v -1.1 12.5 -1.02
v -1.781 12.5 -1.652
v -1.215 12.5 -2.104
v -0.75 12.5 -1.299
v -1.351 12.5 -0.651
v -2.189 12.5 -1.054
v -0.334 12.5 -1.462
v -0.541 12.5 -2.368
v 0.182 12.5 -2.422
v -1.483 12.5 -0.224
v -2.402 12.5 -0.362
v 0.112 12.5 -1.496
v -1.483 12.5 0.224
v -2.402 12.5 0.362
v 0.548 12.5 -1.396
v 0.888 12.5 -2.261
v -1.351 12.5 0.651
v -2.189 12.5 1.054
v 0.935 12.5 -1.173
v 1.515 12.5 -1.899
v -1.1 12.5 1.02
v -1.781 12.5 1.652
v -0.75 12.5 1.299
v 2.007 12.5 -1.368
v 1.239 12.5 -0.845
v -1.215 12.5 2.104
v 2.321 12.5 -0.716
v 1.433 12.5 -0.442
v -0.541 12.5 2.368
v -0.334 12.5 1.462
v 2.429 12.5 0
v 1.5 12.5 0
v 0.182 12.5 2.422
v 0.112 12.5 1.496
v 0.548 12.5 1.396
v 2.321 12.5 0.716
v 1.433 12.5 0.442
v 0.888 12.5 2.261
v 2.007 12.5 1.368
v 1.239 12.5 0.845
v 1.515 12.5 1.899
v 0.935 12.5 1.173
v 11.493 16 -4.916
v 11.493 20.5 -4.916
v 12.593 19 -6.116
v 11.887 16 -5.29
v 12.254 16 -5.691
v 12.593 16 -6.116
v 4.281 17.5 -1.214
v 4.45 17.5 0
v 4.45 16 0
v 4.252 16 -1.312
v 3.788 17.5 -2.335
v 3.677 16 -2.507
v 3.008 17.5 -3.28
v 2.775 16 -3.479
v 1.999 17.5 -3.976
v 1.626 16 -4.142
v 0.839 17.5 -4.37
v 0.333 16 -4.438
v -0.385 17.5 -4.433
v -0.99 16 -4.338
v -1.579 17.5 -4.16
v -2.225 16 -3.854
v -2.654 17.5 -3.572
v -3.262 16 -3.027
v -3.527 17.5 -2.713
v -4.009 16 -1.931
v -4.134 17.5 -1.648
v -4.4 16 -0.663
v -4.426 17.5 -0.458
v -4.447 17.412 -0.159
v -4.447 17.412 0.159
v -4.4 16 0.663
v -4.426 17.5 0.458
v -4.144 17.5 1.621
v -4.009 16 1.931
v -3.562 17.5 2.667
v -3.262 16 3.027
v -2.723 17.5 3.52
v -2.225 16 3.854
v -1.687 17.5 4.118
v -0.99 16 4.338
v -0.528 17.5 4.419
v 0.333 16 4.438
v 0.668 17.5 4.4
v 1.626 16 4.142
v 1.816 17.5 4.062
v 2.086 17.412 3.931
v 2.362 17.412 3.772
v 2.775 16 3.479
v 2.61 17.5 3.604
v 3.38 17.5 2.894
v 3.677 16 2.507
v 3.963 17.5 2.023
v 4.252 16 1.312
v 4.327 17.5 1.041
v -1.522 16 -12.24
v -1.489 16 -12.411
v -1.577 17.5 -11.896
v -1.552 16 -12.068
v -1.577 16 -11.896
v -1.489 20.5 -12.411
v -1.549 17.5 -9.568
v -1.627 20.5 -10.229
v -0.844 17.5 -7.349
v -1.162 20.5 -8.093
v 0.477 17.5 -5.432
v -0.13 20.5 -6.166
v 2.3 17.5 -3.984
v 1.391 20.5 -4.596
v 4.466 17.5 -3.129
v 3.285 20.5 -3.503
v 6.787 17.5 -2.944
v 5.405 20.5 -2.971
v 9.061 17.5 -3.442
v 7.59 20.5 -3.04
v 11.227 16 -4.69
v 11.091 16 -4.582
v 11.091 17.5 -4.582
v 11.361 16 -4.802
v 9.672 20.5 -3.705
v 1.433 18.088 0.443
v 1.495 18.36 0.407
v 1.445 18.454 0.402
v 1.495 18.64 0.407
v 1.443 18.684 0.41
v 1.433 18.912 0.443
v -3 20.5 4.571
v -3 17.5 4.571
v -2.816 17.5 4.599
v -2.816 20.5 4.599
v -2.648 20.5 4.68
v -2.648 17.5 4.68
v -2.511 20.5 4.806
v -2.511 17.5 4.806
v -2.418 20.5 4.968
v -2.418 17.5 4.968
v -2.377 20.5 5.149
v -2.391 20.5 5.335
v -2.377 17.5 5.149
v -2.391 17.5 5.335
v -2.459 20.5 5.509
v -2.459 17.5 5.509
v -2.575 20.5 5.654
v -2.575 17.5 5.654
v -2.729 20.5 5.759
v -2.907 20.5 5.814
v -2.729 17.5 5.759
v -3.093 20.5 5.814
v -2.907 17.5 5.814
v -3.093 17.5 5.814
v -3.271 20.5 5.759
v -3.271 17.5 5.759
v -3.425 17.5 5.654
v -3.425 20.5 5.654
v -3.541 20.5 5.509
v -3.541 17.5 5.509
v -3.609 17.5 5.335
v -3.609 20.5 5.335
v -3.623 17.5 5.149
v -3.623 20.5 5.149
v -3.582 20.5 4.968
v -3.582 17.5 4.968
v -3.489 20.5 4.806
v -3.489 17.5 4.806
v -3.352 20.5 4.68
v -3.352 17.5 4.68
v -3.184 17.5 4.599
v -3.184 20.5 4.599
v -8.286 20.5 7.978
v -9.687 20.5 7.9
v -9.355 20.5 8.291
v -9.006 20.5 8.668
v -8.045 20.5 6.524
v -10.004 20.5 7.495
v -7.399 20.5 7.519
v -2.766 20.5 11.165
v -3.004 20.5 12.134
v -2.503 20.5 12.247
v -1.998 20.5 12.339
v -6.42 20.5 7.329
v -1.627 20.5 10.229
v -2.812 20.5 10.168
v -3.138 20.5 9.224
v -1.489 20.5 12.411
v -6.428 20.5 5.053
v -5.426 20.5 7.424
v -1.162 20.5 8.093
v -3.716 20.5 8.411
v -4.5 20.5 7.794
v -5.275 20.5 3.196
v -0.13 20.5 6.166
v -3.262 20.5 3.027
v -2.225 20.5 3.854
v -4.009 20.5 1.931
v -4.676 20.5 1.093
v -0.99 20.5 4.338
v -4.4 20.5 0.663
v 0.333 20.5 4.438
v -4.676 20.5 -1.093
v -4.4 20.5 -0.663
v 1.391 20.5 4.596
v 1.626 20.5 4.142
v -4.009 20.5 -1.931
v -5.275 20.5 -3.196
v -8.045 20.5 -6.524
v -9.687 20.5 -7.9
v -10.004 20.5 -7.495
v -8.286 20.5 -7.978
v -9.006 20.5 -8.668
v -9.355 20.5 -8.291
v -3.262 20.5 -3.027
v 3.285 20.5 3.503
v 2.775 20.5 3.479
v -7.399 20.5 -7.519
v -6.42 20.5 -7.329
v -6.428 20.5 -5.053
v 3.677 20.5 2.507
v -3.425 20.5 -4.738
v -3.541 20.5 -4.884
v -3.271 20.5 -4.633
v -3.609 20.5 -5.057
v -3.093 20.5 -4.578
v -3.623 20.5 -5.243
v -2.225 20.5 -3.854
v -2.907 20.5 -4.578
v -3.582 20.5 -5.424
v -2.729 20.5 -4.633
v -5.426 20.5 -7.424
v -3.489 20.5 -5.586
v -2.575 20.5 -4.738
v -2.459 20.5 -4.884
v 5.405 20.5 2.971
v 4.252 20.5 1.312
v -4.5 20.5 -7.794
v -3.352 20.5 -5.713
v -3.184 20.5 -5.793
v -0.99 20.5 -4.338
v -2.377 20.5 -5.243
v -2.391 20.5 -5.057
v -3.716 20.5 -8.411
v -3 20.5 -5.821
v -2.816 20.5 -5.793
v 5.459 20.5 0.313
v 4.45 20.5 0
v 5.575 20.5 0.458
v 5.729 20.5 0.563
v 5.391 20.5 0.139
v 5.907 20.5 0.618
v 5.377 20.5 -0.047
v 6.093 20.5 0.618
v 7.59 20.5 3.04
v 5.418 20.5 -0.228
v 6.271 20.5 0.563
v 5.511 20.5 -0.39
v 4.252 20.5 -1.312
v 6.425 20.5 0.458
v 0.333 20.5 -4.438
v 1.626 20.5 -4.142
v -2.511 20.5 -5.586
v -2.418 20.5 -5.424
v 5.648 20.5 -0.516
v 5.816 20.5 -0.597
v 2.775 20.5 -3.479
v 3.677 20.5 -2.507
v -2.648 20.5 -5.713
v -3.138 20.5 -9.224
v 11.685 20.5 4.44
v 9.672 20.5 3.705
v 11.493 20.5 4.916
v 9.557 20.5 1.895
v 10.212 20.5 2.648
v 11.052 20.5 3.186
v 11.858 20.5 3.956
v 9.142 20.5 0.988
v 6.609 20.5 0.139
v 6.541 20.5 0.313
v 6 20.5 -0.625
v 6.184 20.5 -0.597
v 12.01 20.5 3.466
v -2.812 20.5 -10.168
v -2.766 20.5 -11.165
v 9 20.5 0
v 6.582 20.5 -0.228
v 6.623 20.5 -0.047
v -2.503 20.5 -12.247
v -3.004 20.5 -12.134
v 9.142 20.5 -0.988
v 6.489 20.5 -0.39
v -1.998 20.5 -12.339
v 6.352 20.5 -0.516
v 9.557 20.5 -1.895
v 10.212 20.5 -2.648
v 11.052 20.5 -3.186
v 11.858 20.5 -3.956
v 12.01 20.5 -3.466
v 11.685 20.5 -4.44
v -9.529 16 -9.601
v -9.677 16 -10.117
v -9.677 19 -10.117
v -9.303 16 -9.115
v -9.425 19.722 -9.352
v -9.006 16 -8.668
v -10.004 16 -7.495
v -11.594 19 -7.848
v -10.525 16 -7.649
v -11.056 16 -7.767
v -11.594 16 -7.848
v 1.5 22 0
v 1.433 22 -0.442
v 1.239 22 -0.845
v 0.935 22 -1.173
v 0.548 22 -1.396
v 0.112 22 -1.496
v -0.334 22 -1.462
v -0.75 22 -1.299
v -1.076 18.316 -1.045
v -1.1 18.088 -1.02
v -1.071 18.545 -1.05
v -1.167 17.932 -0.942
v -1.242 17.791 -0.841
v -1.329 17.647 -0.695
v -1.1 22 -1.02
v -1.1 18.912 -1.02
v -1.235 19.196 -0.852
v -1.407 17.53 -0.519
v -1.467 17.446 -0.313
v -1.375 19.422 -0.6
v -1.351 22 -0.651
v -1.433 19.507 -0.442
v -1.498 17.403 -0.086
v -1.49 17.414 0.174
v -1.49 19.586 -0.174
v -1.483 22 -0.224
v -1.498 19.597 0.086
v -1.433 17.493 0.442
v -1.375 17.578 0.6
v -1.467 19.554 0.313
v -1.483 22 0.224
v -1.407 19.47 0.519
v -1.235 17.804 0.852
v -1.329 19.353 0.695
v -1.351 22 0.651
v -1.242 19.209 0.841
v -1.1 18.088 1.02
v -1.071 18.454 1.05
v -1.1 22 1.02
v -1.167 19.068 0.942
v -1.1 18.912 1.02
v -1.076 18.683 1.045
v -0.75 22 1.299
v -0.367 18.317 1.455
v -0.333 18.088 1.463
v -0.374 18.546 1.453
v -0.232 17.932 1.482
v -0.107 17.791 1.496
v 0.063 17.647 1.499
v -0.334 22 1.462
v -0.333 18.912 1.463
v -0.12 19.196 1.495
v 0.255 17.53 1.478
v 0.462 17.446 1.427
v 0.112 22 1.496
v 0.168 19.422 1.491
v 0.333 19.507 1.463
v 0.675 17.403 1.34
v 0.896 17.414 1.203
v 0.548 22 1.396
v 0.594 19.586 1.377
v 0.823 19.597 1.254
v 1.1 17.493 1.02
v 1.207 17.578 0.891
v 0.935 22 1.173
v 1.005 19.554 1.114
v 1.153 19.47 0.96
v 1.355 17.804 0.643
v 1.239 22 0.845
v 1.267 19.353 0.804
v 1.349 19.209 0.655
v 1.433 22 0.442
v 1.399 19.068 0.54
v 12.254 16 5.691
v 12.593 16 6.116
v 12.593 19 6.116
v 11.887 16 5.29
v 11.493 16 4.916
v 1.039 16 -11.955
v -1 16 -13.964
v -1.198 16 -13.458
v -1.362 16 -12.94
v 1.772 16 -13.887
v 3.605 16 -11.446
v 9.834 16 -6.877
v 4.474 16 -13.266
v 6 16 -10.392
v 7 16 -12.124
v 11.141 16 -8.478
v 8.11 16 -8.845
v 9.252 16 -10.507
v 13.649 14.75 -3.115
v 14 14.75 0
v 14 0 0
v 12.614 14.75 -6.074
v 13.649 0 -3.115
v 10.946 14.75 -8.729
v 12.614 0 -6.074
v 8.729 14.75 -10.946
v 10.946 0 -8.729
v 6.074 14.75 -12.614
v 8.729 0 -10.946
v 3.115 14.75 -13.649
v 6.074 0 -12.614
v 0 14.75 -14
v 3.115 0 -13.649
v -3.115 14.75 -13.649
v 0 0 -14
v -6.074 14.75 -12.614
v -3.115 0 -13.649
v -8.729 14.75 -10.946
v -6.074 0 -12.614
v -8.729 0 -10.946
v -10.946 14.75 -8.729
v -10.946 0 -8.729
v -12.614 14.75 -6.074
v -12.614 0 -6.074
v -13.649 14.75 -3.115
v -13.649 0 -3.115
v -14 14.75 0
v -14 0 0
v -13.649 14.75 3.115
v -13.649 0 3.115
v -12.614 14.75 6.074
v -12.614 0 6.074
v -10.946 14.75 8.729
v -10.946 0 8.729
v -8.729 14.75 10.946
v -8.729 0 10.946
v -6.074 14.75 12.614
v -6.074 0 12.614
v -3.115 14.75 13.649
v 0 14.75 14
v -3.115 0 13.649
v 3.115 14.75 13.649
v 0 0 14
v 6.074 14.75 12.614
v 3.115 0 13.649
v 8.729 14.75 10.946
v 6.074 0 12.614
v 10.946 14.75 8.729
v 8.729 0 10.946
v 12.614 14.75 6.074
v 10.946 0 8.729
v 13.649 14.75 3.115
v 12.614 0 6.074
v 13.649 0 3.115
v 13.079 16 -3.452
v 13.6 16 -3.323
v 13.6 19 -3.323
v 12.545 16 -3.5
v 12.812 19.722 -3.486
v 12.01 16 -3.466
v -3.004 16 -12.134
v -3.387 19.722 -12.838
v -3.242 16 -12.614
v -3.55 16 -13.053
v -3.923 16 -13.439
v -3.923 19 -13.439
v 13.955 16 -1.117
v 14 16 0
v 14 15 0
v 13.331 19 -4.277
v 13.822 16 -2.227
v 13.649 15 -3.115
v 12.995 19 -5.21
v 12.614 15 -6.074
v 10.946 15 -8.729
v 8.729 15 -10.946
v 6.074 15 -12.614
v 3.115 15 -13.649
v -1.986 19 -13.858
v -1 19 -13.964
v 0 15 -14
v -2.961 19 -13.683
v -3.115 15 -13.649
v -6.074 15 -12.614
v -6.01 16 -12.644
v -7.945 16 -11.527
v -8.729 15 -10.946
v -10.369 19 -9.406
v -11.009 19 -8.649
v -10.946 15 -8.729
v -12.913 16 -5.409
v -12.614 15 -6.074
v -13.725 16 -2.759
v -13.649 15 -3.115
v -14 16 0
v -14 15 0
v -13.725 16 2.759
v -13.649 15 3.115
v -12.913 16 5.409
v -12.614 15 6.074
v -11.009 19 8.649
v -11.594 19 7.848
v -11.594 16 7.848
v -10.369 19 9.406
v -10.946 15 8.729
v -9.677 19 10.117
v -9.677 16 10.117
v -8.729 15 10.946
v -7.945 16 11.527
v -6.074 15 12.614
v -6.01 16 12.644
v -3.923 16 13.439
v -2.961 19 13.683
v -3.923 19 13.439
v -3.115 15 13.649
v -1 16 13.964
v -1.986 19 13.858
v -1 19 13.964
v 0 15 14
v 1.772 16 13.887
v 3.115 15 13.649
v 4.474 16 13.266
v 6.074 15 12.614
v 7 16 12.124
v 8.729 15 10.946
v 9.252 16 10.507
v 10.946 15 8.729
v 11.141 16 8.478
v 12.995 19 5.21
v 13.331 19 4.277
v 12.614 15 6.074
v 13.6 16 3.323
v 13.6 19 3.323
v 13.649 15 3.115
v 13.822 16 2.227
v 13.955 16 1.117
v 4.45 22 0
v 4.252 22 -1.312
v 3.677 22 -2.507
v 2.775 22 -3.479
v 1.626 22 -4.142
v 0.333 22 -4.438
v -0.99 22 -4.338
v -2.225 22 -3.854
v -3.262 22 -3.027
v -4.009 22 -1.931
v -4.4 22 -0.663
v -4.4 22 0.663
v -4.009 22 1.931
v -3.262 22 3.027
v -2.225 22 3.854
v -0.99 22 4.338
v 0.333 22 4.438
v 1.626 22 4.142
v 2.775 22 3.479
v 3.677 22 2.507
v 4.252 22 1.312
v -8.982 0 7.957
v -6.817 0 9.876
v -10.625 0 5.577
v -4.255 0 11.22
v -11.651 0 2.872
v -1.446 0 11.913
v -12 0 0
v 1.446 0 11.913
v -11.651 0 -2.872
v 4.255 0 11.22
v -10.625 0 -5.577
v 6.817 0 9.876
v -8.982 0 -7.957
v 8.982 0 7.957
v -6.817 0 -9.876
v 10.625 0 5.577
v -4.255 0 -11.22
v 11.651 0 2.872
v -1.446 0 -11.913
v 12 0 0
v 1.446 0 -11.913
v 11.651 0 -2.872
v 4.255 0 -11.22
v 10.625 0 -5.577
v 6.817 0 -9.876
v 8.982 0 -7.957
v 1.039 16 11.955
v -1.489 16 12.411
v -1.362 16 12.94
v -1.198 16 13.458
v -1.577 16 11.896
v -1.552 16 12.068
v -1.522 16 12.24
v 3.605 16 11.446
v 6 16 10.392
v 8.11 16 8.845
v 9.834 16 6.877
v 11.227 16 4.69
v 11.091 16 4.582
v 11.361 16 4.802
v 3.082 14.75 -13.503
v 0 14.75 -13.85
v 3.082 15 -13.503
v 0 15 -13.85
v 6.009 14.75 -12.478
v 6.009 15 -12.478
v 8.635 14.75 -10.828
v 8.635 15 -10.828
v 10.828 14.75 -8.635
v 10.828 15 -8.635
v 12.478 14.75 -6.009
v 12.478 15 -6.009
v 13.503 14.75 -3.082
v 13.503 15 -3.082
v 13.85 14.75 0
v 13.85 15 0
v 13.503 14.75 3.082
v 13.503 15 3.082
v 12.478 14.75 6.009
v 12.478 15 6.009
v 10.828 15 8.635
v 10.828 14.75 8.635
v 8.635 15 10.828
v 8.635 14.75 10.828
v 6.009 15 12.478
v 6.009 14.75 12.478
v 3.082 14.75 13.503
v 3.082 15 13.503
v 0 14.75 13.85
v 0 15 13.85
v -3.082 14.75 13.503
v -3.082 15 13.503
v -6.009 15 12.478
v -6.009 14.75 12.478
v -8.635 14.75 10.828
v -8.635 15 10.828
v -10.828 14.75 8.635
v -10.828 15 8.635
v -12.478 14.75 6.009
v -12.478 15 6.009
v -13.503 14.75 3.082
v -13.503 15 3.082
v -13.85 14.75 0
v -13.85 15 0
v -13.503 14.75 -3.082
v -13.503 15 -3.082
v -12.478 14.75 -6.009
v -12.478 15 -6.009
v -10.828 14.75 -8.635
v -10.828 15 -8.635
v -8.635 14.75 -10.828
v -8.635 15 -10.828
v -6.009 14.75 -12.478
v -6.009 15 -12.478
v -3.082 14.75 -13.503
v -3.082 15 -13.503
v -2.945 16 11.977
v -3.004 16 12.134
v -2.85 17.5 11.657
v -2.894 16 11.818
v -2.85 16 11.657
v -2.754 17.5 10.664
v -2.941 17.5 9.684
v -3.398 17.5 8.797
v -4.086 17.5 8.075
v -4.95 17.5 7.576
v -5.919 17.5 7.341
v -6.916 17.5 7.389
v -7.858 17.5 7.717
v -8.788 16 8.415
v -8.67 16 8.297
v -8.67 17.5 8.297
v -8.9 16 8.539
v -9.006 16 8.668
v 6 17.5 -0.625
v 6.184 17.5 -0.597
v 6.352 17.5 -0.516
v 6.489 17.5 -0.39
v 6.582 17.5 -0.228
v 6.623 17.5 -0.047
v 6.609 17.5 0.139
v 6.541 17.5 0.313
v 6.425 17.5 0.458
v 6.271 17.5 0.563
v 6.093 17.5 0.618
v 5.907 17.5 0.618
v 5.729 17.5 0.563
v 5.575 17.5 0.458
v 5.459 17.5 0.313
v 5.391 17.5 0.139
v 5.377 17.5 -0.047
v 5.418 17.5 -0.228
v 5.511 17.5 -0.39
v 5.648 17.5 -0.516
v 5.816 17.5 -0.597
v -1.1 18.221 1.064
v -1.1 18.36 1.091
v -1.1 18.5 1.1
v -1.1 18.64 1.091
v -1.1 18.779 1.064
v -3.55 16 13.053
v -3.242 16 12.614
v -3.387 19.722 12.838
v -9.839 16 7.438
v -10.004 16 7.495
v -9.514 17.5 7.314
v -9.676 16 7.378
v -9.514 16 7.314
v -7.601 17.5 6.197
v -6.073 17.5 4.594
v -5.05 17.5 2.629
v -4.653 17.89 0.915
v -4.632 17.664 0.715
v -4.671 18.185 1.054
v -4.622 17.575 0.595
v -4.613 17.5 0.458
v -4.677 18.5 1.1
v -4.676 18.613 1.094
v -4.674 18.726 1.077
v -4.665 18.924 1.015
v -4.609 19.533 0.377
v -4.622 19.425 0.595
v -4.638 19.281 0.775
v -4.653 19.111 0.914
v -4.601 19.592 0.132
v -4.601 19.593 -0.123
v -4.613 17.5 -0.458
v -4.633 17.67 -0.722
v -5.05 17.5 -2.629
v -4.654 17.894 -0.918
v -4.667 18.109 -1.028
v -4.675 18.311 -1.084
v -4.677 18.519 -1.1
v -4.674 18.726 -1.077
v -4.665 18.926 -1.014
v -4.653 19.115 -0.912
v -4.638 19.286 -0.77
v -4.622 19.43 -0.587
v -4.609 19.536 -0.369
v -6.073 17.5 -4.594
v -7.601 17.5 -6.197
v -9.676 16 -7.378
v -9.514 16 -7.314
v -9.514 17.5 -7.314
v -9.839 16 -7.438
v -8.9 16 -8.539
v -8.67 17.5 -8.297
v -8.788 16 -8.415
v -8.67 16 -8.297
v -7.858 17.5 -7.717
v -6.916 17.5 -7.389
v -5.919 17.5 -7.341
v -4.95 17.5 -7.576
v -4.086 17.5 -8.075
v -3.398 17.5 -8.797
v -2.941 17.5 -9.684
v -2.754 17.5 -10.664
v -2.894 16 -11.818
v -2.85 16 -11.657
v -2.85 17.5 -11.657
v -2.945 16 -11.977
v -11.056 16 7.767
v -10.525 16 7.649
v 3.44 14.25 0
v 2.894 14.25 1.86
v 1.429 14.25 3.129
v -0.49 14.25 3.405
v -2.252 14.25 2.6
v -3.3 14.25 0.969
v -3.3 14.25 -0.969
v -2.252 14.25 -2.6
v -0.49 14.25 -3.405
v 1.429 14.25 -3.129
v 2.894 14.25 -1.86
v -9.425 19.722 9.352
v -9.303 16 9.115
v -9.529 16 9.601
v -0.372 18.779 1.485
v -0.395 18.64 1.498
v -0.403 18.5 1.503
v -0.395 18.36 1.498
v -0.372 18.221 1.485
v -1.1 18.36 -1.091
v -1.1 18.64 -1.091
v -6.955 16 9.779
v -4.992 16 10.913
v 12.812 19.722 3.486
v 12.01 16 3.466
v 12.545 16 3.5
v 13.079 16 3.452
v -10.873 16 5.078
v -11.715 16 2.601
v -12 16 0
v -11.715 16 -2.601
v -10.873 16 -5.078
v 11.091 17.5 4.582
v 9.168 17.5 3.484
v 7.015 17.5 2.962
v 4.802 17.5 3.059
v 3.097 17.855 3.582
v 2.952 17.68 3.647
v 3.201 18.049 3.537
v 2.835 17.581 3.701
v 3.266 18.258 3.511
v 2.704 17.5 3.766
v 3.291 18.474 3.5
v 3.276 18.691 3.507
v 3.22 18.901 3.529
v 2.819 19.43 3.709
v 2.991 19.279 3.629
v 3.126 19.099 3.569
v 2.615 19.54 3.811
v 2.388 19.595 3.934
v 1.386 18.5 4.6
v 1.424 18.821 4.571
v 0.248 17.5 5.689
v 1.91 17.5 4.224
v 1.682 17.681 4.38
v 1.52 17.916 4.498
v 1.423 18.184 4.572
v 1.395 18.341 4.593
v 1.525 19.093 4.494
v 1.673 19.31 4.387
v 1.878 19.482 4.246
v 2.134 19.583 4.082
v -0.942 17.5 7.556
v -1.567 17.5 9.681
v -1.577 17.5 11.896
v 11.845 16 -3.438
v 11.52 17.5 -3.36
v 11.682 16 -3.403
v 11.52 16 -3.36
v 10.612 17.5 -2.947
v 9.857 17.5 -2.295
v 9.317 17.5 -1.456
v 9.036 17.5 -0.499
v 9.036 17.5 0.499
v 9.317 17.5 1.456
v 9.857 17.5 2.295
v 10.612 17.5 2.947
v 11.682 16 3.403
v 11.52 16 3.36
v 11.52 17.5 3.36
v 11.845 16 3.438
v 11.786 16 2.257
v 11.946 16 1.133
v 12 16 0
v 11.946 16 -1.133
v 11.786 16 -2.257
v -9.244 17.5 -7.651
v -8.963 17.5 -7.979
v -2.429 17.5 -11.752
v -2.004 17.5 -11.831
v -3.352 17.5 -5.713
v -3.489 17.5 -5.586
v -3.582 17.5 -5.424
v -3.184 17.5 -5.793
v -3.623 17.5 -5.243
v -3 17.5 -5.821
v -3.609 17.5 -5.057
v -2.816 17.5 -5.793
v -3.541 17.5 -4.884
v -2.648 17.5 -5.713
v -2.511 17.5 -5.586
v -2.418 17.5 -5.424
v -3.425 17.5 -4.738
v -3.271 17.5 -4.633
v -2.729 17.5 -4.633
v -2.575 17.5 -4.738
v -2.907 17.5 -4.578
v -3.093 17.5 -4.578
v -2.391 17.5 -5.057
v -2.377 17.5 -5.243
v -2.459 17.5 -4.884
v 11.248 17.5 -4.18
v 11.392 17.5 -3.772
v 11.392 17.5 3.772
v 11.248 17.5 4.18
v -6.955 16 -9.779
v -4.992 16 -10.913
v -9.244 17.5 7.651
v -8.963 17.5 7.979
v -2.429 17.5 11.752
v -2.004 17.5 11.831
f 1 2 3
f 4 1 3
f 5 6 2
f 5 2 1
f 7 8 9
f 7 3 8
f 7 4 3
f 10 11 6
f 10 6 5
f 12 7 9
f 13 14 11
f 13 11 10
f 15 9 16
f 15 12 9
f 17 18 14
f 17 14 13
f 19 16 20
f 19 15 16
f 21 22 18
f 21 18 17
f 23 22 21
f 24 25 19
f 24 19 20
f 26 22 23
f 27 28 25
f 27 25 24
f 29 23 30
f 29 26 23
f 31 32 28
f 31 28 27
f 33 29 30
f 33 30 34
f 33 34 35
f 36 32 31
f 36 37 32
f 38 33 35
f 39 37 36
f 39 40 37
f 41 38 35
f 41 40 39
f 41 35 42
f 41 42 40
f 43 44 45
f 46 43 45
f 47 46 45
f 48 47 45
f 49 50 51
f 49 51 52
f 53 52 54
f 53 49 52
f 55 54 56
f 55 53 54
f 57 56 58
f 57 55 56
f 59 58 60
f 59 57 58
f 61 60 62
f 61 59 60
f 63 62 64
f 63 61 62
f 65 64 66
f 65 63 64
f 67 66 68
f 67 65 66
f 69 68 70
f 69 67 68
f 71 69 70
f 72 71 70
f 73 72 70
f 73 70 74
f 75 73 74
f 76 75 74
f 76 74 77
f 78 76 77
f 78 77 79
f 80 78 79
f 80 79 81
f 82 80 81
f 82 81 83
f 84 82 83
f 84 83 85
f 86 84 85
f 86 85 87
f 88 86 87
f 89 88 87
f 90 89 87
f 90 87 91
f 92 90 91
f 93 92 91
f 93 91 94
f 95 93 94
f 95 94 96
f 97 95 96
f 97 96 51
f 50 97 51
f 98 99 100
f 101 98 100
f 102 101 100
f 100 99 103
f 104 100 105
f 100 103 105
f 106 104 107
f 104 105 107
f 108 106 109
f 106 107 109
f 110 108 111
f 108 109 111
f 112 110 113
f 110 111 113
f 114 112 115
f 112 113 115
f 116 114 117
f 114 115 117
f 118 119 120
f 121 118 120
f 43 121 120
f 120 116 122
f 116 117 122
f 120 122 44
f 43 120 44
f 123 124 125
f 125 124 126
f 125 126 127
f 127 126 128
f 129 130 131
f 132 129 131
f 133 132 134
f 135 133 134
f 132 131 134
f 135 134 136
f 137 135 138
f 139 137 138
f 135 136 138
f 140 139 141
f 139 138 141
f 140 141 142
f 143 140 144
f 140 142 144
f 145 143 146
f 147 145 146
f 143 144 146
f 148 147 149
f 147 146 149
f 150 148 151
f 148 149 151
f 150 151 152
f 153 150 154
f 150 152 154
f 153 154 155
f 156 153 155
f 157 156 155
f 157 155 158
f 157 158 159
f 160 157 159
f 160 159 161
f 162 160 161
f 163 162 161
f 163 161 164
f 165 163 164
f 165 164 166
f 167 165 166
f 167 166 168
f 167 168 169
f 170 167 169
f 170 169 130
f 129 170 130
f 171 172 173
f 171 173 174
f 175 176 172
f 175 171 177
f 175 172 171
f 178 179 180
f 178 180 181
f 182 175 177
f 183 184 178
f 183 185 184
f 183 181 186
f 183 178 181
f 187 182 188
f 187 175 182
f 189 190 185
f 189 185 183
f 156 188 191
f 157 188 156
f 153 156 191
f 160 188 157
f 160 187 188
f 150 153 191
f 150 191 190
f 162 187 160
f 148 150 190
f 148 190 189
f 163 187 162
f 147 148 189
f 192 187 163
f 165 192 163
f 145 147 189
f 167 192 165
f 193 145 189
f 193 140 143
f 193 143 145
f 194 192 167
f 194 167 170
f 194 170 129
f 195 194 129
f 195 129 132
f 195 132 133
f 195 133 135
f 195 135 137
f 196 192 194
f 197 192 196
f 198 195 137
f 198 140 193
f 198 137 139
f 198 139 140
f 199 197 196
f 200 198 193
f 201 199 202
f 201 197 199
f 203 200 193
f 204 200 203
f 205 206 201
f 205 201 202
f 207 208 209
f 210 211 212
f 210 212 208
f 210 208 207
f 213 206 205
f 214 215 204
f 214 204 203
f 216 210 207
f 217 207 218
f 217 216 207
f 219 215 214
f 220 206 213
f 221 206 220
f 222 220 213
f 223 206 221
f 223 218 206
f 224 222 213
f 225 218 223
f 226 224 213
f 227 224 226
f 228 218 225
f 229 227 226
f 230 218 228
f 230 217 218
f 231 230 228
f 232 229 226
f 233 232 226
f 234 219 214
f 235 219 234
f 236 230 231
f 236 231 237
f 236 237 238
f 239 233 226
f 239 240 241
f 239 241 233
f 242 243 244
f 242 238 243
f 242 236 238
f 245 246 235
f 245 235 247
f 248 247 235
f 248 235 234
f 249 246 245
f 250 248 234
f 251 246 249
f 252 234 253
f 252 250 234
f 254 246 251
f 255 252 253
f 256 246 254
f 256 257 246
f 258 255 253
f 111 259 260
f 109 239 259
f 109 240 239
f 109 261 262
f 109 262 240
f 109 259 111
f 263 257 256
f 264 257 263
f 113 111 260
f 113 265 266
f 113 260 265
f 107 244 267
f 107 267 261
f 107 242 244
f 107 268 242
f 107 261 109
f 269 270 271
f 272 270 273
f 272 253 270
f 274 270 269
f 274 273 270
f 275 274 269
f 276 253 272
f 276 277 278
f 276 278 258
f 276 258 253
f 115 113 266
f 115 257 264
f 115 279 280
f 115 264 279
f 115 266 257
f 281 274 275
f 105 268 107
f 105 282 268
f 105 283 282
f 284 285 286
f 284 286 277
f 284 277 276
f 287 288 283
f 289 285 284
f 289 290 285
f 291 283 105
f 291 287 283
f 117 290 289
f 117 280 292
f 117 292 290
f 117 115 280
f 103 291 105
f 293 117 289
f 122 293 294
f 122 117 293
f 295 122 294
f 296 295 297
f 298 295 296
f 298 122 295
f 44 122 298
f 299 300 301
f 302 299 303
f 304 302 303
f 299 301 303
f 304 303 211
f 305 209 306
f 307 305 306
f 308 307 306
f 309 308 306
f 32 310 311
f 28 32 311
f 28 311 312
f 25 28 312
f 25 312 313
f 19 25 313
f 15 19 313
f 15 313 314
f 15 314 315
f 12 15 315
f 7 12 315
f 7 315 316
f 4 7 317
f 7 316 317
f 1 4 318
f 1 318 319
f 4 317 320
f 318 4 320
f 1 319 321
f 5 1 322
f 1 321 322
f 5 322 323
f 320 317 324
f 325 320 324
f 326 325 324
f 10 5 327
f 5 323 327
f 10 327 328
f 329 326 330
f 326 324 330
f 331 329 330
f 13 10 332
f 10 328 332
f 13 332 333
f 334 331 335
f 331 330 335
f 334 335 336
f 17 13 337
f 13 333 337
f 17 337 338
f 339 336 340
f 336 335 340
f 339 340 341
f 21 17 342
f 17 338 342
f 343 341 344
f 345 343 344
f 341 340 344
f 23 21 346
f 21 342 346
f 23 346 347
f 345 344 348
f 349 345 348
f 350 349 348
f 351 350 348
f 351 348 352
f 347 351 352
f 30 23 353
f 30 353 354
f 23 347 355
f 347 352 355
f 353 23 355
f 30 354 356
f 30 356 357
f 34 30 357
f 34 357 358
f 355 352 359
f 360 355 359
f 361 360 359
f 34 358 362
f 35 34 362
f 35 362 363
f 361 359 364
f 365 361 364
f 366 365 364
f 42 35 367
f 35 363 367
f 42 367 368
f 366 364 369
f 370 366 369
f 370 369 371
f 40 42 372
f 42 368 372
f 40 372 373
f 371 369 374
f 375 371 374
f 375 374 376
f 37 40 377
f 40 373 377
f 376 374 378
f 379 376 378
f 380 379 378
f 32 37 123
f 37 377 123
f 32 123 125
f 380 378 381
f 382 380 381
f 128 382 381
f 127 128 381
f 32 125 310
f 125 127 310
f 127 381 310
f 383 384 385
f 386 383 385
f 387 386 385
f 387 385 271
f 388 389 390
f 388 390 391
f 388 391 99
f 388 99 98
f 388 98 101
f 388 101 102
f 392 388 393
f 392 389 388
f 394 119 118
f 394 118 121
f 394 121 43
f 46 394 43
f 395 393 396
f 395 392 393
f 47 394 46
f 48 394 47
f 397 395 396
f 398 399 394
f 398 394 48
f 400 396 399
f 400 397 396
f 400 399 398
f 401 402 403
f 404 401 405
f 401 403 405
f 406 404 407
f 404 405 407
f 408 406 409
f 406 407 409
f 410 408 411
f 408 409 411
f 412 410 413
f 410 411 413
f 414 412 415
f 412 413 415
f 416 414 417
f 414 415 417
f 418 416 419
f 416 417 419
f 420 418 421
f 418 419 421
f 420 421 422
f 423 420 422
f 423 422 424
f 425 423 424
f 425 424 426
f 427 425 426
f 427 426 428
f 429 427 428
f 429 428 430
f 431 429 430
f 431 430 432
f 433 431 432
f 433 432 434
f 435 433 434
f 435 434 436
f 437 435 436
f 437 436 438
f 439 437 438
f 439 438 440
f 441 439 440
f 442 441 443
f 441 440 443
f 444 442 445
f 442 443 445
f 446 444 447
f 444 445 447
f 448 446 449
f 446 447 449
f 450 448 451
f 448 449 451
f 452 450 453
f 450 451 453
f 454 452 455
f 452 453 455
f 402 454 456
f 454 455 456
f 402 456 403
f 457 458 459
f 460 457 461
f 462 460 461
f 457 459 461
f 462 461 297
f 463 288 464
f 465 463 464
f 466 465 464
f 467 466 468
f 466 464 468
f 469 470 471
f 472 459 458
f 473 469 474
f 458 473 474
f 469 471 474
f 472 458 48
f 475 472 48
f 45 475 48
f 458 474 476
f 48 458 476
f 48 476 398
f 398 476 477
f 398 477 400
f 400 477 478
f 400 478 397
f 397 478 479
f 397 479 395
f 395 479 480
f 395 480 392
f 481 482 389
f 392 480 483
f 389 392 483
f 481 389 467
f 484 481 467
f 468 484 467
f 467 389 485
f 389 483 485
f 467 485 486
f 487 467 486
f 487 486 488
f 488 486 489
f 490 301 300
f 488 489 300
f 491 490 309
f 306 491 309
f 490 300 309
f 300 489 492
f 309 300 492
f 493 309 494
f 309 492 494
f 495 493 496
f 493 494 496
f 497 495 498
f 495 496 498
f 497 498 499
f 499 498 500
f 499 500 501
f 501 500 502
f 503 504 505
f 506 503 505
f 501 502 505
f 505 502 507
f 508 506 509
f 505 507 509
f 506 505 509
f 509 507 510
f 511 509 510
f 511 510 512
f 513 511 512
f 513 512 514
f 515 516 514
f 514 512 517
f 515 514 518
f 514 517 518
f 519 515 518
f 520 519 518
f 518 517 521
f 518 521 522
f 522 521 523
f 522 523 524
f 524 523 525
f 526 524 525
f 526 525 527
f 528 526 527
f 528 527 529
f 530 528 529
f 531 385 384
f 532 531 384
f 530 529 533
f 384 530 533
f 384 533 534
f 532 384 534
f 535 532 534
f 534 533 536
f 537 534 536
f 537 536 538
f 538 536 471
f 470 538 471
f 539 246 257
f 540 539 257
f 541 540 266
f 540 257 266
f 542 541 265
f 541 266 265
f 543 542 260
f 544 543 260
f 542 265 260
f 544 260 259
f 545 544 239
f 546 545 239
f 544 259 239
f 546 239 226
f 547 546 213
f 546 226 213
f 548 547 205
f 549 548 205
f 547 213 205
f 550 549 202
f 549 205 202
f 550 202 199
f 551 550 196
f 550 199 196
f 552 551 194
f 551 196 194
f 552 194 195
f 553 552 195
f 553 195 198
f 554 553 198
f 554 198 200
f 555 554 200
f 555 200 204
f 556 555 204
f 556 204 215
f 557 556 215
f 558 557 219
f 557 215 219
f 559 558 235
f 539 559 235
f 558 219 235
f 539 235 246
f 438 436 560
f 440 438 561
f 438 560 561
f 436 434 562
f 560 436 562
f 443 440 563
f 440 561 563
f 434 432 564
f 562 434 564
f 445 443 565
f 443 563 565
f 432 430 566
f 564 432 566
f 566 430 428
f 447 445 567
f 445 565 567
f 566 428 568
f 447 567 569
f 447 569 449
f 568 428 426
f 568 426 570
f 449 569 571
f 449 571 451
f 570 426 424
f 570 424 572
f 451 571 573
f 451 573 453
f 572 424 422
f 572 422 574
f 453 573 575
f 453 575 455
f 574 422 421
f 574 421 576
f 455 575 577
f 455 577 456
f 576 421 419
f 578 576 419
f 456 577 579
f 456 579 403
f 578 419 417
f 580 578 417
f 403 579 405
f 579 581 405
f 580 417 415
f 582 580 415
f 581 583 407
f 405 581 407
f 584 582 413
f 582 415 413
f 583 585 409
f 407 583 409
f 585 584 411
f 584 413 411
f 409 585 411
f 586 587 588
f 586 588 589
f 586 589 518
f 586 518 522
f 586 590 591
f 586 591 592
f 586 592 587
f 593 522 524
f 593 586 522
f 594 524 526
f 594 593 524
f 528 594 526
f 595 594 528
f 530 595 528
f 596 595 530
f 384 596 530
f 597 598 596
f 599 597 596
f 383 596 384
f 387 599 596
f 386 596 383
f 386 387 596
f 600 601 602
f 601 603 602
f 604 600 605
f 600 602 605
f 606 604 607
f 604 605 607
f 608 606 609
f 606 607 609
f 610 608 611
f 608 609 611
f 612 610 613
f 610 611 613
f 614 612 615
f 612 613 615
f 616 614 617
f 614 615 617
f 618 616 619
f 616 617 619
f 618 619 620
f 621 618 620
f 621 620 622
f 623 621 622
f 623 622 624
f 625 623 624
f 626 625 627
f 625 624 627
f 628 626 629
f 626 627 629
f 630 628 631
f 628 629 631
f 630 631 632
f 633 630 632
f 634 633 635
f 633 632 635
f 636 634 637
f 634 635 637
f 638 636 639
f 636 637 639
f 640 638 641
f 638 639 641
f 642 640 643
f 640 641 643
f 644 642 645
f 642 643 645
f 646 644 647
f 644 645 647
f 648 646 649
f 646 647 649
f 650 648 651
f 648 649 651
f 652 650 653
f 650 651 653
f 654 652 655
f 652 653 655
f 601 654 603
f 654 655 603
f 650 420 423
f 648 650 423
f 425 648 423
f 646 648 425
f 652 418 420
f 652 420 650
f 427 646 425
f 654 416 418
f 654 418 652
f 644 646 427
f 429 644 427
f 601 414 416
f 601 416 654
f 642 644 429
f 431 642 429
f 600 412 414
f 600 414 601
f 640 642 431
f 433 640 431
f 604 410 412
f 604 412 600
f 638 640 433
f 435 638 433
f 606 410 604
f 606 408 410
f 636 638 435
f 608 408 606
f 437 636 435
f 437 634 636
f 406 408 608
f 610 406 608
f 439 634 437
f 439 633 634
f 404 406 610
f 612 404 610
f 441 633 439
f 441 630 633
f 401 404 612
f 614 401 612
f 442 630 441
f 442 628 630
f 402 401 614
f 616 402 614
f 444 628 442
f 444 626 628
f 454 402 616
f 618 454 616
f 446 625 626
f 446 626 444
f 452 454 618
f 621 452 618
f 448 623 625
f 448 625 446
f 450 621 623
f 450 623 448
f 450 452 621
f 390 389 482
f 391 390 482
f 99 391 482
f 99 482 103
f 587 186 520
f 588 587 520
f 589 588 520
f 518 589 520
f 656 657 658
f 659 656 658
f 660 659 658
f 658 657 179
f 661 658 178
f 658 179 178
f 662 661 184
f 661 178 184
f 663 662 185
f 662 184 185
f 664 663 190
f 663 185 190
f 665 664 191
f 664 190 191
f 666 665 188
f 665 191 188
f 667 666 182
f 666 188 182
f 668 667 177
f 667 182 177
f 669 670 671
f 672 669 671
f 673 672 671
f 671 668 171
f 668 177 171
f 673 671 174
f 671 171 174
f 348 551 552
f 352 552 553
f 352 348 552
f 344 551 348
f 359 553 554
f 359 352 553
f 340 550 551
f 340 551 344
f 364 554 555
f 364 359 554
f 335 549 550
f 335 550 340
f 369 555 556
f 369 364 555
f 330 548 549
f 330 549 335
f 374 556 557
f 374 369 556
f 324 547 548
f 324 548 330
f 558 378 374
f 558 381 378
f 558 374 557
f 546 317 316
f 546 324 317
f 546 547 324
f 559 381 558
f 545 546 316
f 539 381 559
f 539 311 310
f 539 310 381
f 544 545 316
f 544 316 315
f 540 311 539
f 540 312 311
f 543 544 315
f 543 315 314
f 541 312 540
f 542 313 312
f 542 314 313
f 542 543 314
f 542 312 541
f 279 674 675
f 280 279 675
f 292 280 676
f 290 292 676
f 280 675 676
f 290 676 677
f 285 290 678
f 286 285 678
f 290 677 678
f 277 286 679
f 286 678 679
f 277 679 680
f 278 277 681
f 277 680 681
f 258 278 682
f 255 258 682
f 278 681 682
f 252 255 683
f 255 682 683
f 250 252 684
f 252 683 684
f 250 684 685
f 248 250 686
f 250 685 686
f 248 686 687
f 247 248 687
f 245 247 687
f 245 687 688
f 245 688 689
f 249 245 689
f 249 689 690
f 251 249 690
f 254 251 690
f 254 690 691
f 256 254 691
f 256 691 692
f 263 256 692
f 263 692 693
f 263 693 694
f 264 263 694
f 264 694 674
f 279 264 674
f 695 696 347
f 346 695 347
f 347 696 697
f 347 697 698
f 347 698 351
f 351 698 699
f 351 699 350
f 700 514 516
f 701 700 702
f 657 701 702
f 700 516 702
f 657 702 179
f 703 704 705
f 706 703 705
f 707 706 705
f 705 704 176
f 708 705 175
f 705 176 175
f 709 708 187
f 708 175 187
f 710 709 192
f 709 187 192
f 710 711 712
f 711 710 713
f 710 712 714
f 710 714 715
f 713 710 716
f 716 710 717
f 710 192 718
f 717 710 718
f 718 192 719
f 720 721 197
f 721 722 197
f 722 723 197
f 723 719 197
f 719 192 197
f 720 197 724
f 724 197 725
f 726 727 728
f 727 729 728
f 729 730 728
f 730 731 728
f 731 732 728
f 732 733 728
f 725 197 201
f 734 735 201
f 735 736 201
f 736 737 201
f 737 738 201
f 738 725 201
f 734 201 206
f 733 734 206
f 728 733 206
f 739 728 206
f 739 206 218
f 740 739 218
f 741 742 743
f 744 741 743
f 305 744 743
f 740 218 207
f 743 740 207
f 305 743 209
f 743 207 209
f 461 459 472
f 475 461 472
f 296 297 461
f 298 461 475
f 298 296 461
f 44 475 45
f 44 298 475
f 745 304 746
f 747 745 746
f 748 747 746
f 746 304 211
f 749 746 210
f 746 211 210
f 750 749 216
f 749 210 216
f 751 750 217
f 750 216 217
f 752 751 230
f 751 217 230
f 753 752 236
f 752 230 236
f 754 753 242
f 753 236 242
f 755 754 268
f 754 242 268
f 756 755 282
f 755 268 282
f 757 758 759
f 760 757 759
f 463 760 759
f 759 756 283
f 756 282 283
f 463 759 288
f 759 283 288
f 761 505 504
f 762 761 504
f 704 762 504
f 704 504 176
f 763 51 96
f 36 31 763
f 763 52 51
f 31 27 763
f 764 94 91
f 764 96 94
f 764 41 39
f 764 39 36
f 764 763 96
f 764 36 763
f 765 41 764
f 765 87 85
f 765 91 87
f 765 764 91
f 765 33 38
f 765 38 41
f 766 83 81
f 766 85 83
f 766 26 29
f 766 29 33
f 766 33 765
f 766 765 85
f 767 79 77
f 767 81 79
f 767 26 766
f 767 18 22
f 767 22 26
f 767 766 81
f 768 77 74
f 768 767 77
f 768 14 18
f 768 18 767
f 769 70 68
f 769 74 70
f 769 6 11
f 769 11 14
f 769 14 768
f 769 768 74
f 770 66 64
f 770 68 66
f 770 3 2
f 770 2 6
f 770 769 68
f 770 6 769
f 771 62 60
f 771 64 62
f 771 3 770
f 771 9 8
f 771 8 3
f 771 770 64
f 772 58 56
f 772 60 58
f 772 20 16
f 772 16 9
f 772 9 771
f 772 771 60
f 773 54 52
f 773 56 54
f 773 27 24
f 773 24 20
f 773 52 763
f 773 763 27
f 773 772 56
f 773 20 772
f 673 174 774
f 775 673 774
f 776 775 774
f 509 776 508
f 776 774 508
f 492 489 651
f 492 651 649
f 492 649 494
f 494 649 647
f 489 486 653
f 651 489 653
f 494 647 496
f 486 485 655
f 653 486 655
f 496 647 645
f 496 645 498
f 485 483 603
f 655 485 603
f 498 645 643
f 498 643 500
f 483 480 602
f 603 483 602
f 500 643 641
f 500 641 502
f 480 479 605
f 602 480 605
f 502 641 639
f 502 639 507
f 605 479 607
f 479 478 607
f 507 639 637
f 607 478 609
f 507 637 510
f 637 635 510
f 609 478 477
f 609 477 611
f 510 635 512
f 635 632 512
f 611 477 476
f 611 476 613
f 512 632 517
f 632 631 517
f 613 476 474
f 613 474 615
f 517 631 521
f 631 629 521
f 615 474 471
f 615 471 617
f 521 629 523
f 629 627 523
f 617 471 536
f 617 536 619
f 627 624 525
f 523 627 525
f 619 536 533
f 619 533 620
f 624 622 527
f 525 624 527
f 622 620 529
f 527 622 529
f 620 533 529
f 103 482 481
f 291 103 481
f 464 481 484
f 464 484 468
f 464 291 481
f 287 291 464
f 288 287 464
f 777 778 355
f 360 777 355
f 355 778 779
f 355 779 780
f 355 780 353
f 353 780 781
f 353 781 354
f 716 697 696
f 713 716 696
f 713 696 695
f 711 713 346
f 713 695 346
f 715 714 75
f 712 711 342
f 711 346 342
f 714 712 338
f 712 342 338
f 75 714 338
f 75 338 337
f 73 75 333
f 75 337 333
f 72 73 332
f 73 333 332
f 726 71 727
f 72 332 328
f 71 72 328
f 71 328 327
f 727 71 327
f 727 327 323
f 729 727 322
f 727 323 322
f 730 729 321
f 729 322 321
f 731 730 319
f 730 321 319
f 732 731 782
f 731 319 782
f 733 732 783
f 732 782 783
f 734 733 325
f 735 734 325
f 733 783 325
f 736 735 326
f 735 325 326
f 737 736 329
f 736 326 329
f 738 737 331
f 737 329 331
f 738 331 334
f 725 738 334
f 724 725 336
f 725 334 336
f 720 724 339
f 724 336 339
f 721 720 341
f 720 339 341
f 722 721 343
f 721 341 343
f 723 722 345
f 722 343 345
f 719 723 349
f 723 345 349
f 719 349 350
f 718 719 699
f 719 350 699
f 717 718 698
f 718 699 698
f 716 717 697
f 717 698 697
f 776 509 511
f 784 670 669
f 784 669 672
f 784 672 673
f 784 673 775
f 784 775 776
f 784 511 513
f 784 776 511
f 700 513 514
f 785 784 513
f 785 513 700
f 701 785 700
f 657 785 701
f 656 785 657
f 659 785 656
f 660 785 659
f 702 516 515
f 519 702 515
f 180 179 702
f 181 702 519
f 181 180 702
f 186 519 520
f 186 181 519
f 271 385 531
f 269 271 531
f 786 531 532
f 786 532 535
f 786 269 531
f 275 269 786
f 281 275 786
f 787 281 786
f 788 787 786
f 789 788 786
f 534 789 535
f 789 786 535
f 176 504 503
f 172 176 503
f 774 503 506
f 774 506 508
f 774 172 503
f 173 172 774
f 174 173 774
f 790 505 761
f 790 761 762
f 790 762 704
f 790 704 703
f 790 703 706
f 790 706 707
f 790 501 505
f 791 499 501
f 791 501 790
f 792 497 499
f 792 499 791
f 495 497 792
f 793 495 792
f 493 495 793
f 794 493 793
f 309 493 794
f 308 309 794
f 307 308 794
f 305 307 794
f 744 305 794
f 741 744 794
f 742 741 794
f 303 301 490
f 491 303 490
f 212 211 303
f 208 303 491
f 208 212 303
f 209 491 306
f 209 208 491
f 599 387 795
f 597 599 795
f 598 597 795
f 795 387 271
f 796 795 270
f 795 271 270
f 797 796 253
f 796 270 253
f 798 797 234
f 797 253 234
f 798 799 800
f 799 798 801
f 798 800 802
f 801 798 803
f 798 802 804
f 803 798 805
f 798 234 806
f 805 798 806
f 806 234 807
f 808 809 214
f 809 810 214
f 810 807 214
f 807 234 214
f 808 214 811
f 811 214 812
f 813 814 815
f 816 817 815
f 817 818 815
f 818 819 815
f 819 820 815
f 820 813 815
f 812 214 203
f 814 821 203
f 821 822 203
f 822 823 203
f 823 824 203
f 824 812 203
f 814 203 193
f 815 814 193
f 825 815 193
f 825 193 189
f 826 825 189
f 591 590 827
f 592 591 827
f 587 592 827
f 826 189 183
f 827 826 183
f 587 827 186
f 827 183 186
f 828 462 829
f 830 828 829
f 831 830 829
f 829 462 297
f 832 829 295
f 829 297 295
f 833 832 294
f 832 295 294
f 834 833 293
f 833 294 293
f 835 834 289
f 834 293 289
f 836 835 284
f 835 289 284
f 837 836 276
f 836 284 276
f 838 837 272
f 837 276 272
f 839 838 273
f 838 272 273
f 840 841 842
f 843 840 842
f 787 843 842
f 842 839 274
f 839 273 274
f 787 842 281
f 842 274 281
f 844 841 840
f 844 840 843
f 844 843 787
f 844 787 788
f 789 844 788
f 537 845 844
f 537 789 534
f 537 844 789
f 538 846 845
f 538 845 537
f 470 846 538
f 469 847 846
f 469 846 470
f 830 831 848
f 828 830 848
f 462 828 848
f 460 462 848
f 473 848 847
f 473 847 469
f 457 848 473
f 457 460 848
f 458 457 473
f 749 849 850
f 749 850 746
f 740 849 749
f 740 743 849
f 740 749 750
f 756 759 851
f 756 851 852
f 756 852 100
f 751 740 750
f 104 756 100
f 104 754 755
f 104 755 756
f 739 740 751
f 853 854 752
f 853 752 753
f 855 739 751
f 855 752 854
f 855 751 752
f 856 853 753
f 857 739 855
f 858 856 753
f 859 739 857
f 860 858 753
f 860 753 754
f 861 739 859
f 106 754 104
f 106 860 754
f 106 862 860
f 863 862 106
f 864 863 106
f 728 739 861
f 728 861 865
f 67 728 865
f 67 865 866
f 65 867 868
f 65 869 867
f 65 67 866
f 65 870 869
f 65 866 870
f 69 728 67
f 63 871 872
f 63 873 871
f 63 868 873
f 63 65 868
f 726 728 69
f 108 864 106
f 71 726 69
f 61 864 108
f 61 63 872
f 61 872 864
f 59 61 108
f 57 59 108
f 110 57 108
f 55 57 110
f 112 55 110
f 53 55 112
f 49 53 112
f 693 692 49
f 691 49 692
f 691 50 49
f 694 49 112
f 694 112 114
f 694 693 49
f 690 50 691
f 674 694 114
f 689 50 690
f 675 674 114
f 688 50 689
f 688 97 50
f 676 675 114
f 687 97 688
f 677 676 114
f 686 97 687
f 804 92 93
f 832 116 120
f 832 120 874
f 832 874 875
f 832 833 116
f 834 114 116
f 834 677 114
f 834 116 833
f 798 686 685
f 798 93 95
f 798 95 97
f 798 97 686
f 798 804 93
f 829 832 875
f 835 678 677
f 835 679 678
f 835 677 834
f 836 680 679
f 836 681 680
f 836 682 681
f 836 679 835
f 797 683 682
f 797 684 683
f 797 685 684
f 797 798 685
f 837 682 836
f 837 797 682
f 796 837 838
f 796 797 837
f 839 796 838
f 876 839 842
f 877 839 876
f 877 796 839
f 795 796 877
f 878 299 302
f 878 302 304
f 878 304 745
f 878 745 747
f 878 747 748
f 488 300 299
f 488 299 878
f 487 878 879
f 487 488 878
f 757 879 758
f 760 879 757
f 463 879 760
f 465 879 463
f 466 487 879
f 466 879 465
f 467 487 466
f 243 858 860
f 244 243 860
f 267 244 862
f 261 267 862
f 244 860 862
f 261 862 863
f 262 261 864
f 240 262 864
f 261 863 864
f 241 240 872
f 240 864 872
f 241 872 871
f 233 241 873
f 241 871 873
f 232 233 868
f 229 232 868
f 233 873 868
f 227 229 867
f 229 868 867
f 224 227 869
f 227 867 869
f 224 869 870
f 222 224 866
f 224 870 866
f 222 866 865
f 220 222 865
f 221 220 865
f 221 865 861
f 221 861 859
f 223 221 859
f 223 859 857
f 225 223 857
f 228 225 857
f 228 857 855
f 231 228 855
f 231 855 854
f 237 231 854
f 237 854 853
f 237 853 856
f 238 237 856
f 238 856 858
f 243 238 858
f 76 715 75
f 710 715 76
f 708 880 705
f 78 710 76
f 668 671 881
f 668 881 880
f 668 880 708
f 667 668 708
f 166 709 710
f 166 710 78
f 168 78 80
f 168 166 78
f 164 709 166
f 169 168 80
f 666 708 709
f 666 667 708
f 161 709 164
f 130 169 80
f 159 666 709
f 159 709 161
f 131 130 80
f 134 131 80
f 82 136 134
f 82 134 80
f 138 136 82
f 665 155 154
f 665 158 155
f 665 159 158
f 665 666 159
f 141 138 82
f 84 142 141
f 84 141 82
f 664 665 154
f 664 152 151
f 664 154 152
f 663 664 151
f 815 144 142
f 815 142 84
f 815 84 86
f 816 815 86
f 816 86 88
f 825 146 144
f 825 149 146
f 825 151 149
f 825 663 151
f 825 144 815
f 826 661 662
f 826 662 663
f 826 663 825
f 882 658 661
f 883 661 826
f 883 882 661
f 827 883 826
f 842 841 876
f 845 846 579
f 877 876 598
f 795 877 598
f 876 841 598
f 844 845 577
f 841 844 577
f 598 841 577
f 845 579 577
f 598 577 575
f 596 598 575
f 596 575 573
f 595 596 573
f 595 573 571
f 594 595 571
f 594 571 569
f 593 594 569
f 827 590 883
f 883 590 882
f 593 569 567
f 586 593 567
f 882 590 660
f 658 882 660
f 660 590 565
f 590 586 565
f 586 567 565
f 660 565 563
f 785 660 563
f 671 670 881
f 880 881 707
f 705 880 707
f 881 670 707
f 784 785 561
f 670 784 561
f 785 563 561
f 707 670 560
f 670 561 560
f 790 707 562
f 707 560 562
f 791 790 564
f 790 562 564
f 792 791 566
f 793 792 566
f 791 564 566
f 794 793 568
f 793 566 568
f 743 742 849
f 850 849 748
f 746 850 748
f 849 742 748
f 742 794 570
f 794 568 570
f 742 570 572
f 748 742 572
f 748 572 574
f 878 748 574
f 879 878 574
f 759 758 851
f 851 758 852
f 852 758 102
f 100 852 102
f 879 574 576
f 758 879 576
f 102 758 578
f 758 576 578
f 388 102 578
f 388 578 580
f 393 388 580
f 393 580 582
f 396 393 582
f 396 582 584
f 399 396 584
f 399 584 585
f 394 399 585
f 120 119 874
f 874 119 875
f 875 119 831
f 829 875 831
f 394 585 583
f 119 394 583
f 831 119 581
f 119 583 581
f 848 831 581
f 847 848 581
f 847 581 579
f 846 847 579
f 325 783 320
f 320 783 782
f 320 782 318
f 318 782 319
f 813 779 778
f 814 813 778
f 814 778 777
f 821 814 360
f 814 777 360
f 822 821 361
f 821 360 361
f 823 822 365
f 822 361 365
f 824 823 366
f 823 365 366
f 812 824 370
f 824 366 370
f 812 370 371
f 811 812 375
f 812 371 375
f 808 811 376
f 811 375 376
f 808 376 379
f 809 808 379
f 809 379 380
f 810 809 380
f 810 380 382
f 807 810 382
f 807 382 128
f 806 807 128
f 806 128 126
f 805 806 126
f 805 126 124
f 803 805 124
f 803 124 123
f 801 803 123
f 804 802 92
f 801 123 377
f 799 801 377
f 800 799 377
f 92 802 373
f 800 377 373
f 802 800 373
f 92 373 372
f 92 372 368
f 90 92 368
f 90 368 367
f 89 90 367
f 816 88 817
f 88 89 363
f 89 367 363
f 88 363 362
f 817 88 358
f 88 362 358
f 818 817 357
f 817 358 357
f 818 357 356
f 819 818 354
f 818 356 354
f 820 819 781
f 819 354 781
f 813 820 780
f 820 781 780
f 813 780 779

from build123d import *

# Parameters (mm, degrees)
SKETCH1_R                          = 14
BOSS_EXTRUDE1_DEPTH                = 20.5
SKETCH2_R                          = 12
CUT_EXTRUDE1_DEPTH                 = 17.5
CHAMFER1_SIZE                      = 1.5
SKETCH3_W                          = 0.15
SKETCH3_H                          = 0.25
SKETCH4_R                          = 4.45
BOSS_EXTRUDE2_DEPTH                = 1.5
BOSS_EXTRUDE2_DEPTH_BACK           = 4.5
SKETCH10_R                         = 4.45
BOSS_EXTRUDE3_DEPTH                = 3.5
BOSS_EXTRUDE3_TAPER                = 30
SKETCH5_R                          = 1.5
CUT_EXTRUDE2_DEPTH                 = 23
CUT_EXTRUDE3_DEPTH                 = 4.5
M1_6X0_35_TAPPED_HOLE1_D           = 1.25
M1_6X0_35_TAPPED_HOLE1_DEPTH       = 4.25
M1_6X0_35_TAPPED_HOLE1_TIP         = 0.375537887
M2_CLEARANCE_HOLE4_D               = 2.2
M2_CLEARANCE_HOLE4_DEPTH           = 3.5
M2_CLEARANCE_HOLE4_TIP             = 0.660946681
M2_CLEARANCE_HOLE4_ON_FACE_2_D     = 2.2
M2_CLEARANCE_HOLE4_ON_FACE_2_DEPTH = 3.5
M2_CLEARANCE_HOLE4_ON_FACE_2_TIP   = 0.660946681


with BuildPart() as part:
    # Sketch1 → Boss-Extrude1 (new body)
    with BuildSketch(Plane(origin=(0, 0, 0), x_dir=(1, 0, 0), z_dir=(0, 1, 0))):
        Circle(SKETCH1_R)
    extrude(amount=BOSS_EXTRUDE1_DEPTH)

    # Sketch2 → Cut-Extrude1 (cut)
    with BuildSketch(Plane.XZ):
        Circle(SKETCH2_R)
    extrude(amount=-CUT_EXTRUDE1_DEPTH, mode=Mode.SUBTRACT)

    # Chamfer1
    chamfer1_edges = [part.edges().sort_by_distance(p)[0] for p in [
        (-14, 20.5, 0),
    ]]
    chamfer(chamfer1_edges, length=CHAMFER1_SIZE)

    # Sketch3 → Cut-Revolve1 (revolve, cut)
    with BuildSketch(Plane(origin=(0, 0, 0), x_dir=(0, 0, -1), z_dir=(1, 0, 0))):
        with Locations((13.925, 14.875)):
            Rectangle(SKETCH3_W, SKETCH3_H)
    revolve(axis=Axis((0, 20.5, 0), (0, -1, 0)), mode=Mode.SUBTRACT)

    # Sketch4 → Boss-Extrude2 (add, two sides)
    with BuildSketch(Plane(origin=(0, 20.5, 0), x_dir=(1, 0, 0), z_dir=(0, 1, 0))) as boss_extrude2_sk:
        Circle(SKETCH4_R)
    extrude(amount=BOSS_EXTRUDE2_DEPTH)
    extrude(boss_extrude2_sk.sketch, amount=-BOSS_EXTRUDE2_DEPTH_BACK)

    # Sketch10 → Boss-Extrude3 (add)
    with BuildSketch(Plane.XZ.offset(-16)):
        Circle(SKETCH10_R)
    extrude(amount=BOSS_EXTRUDE3_DEPTH, taper=BOSS_EXTRUDE3_TAPER)

    # Sketch5 → Cut-Extrude2 (cut, through all)
    with BuildSketch(Plane(origin=(0, 22, 0), x_dir=(1, 0, 0), z_dir=(0, 1, 0))):
        Circle(SKETCH5_R)
    extrude(amount=-CUT_EXTRUDE2_DEPTH, mode=Mode.SUBTRACT)

    # Sketch6 → Cut-Extrude3 (cut)
    with BuildSketch(Plane(origin=(0, 20.5, 0), x_dir=(1, 0, 0), z_dir=(0, 1, 0))):
        with BuildLine():
            ThreePointArc((-10.0036, -7.495197598), (-4.6, 0), (-10.0036, 7.495197598))
            ThreePointArc((-10.0036, 7.495197598), (-12.5, 0), (-10.0036, -7.495197598))
        make_face()
        with BuildLine():
            ThreePointArc((-10.0036, 7.495197598), (-10.789488556, 7.712596878), (-11.5936, 7.847830212))
            ThreePointArc((-11.5936, 7.847830212), (-14, 0), (-11.5936, -7.847830212))
            ThreePointArc((-11.5936, -7.847830212), (-10.789488556, -7.712596878), (-10.0036, -7.495197598))
            ThreePointArc((-10.0036, -7.495197598), (-12.5, 0), (-10.0036, 7.495197598))
        make_face()
        with BuildLine():
            ThreePointArc((-9.006237245, -8.668199968), (-6.25, -10.825317547), (-3.003762755, -12.133730231))
            ThreePointArc((-3.003762755, -12.133730231), (-4.5, -7.794228634), (-9.006237245, -8.668199968))
        make_face()
        with BuildLine():
            ThreePointArc((-9.677498914, -10.116620719), (-7, -12.124355653), (-3.922501086, -13.439270264))
            ThreePointArc((-3.922501086, -13.439270264), (-3.387703302, -12.839581088), (-3.003762755, -12.133730231))
            ThreePointArc((-3.003762755, -12.133730231), (-6.25, -10.825317547), (-9.006237245, -8.668199968))
            ThreePointArc((-9.006237245, -8.668199968), (-9.425551745, -9.353627664), (-9.677498914, -10.116620719))
        make_face()
        with BuildLine():
            ThreePointArc((-0.999620328, -13.964267227), (7, -12.124355653), (12.593220328, -6.116437015))
            ThreePointArc((12.593220328, -6.116437015), (12.074049103, -5.487672744), (11.492831527, -4.91577293))
            ThreePointArc((11.492831527, -4.91577293), (6.25, -10.825317547), (-1.489231527, -12.410970529))
            ThreePointArc((-1.489231527, -12.410970529), (-1.284560547, -13.200269622), (-0.999620328, -13.964267227))
        make_face()
        with BuildLine():
            ThreePointArc((-1.489231527, -12.410970529), (6.25, -10.825317547), (11.492831527, -4.91577293))
            ThreePointArc((11.492831527, -4.91577293), (2.3, -3.983716857), (-1.489231527, -12.410970529))
        make_face()
        with BuildLine():
            ThreePointArc((12.5, 0), (12.376893794, 1.75), (12.01, 3.465530262))
            ThreePointArc((12.01, 3.465530262), (9, 0), (12.01, -3.465530262))
            ThreePointArc((12.01, -3.465530262), (12.376893794, -1.75), (12.5, 0))
        make_face()
        with BuildLine():
            ThreePointArc((13.6, -3.322649545), (13.899640283, -1.673320053), (14, 0))
            ThreePointArc((14, 0), (13.899640283, 1.673320053), (13.6, 3.322649545))
            ThreePointArc((13.6, 3.322649545), (12.813255048, 3.485953424), (12.01, 3.465530262))
            ThreePointArc((12.01, 3.465530262), (12.376893794, 1.75), (12.5, 0))
            ThreePointArc((12.5, 0), (12.376893794, -1.75), (12.01, -3.465530262))
            ThreePointArc((12.01, -3.465530262), (12.813255048, -3.485953424), (13.6, -3.322649545))
        make_face()
        with BuildLine():
            ThreePointArc((11.492831527, 4.91577293), (12.074049103, 5.487672744), (12.593220328, 6.116437015))
            ThreePointArc((12.593220328, 6.116437015), (7, 12.124355653), (-0.999620328, 13.964267227))
            ThreePointArc((-0.999620328, 13.964267227), (-1.284560547, 13.200269622), (-1.489231527, 12.410970529))
            ThreePointArc((-1.489231527, 12.410970529), (6.25, 10.825317547), (11.492831527, 4.91577293))
        make_face()
        with BuildLine():
            ThreePointArc((-1.489231527, 12.410970529), (2.3, 3.983716857), (11.492831527, 4.91577293))
            ThreePointArc((11.492831527, 4.91577293), (6.25, 10.825317547), (-1.489231527, 12.410970529))
        make_face()
        with BuildLine():
            ThreePointArc((-9.006237245, 8.668199968), (-4.5, 7.794228634), (-3.003762755, 12.133730231))
            ThreePointArc((-3.003762755, 12.133730231), (-6.25, 10.825317547), (-9.006237245, 8.668199968))
        make_face()
        with BuildLine():
            ThreePointArc((-3.003762755, 12.133730231), (-3.387703302, 12.839581088), (-3.922501086, 13.439270264))
            ThreePointArc((-3.922501086, 13.439270264), (-7, 12.124355653), (-9.677498914, 10.116620719))
            ThreePointArc((-9.677498914, 10.116620719), (-9.425551745, 9.353627664), (-9.006237245, 8.668199968))
            ThreePointArc((-9.006237245, 8.668199968), (-6.25, 10.825317547), (-3.003762755, 12.133730231))
        make_face()
    extrude(amount=-CUT_EXTRUDE3_DEPTH, mode=Mode.SUBTRACT)

    # M1.6x0.35 Tapped Hole1
    with Locations(Plane(origin=(6, 20.5, 0), x_dir=(0, 0, 1), z_dir=(0, 1, 0))):
        with Locations((0, 0), (5.196152423, -9), (-5.196152423, -9)):
            Hole(M1_6X0_35_TAPPED_HOLE1_D / 2, depth=M1_6X0_35_TAPPED_HOLE1_DEPTH)
            with Locations((0, 0, -(M1_6X0_35_TAPPED_HOLE1_DEPTH + M1_6X0_35_TAPPED_HOLE1_TIP / 2))):  # 118° drill point
                Cone(0, M1_6X0_35_TAPPED_HOLE1_D / 2, M1_6X0_35_TAPPED_HOLE1_TIP, mode=Mode.SUBTRACT)

    # M2 Clearance Hole4
    with Locations(Plane(origin=(-4.6, 18.5, 0), x_dir=(0, 0, -1), z_dir=(-1, 0, 0))):
        with Locations((0, 0)):
            Hole(M2_CLEARANCE_HOLE4_D / 2, depth=M2_CLEARANCE_HOLE4_DEPTH)
            with Locations((0, 0, -(M2_CLEARANCE_HOLE4_DEPTH + M2_CLEARANCE_HOLE4_TIP / 2))):  # 118° drill point
                Cone(0, M2_CLEARANCE_HOLE4_D / 2, M2_CLEARANCE_HOLE4_TIP, mode=Mode.SUBTRACT)

    # M2 Clearance Hole4 on face 2
    with Locations(Plane(origin=(2.3, 18.5, 3.983716857), x_dir=(0.866025303, 0, -0.500000175), z_dir=(0.500000175, 0, 0.866025303))):
        with Locations((0, 0)):
            Hole(M2_CLEARANCE_HOLE4_ON_FACE_2_D / 2, depth=M2_CLEARANCE_HOLE4_ON_FACE_2_DEPTH)
            with Locations((0, 0, -(M2_CLEARANCE_HOLE4_ON_FACE_2_DEPTH + M2_CLEARANCE_HOLE4_ON_FACE_2_TIP / 2))):  # 118° drill point
                Cone(0, M2_CLEARANCE_HOLE4_ON_FACE_2_D / 2, M2_CLEARANCE_HOLE4_ON_FACE_2_TIP, mode=Mode.SUBTRACT)


solid = part.part
